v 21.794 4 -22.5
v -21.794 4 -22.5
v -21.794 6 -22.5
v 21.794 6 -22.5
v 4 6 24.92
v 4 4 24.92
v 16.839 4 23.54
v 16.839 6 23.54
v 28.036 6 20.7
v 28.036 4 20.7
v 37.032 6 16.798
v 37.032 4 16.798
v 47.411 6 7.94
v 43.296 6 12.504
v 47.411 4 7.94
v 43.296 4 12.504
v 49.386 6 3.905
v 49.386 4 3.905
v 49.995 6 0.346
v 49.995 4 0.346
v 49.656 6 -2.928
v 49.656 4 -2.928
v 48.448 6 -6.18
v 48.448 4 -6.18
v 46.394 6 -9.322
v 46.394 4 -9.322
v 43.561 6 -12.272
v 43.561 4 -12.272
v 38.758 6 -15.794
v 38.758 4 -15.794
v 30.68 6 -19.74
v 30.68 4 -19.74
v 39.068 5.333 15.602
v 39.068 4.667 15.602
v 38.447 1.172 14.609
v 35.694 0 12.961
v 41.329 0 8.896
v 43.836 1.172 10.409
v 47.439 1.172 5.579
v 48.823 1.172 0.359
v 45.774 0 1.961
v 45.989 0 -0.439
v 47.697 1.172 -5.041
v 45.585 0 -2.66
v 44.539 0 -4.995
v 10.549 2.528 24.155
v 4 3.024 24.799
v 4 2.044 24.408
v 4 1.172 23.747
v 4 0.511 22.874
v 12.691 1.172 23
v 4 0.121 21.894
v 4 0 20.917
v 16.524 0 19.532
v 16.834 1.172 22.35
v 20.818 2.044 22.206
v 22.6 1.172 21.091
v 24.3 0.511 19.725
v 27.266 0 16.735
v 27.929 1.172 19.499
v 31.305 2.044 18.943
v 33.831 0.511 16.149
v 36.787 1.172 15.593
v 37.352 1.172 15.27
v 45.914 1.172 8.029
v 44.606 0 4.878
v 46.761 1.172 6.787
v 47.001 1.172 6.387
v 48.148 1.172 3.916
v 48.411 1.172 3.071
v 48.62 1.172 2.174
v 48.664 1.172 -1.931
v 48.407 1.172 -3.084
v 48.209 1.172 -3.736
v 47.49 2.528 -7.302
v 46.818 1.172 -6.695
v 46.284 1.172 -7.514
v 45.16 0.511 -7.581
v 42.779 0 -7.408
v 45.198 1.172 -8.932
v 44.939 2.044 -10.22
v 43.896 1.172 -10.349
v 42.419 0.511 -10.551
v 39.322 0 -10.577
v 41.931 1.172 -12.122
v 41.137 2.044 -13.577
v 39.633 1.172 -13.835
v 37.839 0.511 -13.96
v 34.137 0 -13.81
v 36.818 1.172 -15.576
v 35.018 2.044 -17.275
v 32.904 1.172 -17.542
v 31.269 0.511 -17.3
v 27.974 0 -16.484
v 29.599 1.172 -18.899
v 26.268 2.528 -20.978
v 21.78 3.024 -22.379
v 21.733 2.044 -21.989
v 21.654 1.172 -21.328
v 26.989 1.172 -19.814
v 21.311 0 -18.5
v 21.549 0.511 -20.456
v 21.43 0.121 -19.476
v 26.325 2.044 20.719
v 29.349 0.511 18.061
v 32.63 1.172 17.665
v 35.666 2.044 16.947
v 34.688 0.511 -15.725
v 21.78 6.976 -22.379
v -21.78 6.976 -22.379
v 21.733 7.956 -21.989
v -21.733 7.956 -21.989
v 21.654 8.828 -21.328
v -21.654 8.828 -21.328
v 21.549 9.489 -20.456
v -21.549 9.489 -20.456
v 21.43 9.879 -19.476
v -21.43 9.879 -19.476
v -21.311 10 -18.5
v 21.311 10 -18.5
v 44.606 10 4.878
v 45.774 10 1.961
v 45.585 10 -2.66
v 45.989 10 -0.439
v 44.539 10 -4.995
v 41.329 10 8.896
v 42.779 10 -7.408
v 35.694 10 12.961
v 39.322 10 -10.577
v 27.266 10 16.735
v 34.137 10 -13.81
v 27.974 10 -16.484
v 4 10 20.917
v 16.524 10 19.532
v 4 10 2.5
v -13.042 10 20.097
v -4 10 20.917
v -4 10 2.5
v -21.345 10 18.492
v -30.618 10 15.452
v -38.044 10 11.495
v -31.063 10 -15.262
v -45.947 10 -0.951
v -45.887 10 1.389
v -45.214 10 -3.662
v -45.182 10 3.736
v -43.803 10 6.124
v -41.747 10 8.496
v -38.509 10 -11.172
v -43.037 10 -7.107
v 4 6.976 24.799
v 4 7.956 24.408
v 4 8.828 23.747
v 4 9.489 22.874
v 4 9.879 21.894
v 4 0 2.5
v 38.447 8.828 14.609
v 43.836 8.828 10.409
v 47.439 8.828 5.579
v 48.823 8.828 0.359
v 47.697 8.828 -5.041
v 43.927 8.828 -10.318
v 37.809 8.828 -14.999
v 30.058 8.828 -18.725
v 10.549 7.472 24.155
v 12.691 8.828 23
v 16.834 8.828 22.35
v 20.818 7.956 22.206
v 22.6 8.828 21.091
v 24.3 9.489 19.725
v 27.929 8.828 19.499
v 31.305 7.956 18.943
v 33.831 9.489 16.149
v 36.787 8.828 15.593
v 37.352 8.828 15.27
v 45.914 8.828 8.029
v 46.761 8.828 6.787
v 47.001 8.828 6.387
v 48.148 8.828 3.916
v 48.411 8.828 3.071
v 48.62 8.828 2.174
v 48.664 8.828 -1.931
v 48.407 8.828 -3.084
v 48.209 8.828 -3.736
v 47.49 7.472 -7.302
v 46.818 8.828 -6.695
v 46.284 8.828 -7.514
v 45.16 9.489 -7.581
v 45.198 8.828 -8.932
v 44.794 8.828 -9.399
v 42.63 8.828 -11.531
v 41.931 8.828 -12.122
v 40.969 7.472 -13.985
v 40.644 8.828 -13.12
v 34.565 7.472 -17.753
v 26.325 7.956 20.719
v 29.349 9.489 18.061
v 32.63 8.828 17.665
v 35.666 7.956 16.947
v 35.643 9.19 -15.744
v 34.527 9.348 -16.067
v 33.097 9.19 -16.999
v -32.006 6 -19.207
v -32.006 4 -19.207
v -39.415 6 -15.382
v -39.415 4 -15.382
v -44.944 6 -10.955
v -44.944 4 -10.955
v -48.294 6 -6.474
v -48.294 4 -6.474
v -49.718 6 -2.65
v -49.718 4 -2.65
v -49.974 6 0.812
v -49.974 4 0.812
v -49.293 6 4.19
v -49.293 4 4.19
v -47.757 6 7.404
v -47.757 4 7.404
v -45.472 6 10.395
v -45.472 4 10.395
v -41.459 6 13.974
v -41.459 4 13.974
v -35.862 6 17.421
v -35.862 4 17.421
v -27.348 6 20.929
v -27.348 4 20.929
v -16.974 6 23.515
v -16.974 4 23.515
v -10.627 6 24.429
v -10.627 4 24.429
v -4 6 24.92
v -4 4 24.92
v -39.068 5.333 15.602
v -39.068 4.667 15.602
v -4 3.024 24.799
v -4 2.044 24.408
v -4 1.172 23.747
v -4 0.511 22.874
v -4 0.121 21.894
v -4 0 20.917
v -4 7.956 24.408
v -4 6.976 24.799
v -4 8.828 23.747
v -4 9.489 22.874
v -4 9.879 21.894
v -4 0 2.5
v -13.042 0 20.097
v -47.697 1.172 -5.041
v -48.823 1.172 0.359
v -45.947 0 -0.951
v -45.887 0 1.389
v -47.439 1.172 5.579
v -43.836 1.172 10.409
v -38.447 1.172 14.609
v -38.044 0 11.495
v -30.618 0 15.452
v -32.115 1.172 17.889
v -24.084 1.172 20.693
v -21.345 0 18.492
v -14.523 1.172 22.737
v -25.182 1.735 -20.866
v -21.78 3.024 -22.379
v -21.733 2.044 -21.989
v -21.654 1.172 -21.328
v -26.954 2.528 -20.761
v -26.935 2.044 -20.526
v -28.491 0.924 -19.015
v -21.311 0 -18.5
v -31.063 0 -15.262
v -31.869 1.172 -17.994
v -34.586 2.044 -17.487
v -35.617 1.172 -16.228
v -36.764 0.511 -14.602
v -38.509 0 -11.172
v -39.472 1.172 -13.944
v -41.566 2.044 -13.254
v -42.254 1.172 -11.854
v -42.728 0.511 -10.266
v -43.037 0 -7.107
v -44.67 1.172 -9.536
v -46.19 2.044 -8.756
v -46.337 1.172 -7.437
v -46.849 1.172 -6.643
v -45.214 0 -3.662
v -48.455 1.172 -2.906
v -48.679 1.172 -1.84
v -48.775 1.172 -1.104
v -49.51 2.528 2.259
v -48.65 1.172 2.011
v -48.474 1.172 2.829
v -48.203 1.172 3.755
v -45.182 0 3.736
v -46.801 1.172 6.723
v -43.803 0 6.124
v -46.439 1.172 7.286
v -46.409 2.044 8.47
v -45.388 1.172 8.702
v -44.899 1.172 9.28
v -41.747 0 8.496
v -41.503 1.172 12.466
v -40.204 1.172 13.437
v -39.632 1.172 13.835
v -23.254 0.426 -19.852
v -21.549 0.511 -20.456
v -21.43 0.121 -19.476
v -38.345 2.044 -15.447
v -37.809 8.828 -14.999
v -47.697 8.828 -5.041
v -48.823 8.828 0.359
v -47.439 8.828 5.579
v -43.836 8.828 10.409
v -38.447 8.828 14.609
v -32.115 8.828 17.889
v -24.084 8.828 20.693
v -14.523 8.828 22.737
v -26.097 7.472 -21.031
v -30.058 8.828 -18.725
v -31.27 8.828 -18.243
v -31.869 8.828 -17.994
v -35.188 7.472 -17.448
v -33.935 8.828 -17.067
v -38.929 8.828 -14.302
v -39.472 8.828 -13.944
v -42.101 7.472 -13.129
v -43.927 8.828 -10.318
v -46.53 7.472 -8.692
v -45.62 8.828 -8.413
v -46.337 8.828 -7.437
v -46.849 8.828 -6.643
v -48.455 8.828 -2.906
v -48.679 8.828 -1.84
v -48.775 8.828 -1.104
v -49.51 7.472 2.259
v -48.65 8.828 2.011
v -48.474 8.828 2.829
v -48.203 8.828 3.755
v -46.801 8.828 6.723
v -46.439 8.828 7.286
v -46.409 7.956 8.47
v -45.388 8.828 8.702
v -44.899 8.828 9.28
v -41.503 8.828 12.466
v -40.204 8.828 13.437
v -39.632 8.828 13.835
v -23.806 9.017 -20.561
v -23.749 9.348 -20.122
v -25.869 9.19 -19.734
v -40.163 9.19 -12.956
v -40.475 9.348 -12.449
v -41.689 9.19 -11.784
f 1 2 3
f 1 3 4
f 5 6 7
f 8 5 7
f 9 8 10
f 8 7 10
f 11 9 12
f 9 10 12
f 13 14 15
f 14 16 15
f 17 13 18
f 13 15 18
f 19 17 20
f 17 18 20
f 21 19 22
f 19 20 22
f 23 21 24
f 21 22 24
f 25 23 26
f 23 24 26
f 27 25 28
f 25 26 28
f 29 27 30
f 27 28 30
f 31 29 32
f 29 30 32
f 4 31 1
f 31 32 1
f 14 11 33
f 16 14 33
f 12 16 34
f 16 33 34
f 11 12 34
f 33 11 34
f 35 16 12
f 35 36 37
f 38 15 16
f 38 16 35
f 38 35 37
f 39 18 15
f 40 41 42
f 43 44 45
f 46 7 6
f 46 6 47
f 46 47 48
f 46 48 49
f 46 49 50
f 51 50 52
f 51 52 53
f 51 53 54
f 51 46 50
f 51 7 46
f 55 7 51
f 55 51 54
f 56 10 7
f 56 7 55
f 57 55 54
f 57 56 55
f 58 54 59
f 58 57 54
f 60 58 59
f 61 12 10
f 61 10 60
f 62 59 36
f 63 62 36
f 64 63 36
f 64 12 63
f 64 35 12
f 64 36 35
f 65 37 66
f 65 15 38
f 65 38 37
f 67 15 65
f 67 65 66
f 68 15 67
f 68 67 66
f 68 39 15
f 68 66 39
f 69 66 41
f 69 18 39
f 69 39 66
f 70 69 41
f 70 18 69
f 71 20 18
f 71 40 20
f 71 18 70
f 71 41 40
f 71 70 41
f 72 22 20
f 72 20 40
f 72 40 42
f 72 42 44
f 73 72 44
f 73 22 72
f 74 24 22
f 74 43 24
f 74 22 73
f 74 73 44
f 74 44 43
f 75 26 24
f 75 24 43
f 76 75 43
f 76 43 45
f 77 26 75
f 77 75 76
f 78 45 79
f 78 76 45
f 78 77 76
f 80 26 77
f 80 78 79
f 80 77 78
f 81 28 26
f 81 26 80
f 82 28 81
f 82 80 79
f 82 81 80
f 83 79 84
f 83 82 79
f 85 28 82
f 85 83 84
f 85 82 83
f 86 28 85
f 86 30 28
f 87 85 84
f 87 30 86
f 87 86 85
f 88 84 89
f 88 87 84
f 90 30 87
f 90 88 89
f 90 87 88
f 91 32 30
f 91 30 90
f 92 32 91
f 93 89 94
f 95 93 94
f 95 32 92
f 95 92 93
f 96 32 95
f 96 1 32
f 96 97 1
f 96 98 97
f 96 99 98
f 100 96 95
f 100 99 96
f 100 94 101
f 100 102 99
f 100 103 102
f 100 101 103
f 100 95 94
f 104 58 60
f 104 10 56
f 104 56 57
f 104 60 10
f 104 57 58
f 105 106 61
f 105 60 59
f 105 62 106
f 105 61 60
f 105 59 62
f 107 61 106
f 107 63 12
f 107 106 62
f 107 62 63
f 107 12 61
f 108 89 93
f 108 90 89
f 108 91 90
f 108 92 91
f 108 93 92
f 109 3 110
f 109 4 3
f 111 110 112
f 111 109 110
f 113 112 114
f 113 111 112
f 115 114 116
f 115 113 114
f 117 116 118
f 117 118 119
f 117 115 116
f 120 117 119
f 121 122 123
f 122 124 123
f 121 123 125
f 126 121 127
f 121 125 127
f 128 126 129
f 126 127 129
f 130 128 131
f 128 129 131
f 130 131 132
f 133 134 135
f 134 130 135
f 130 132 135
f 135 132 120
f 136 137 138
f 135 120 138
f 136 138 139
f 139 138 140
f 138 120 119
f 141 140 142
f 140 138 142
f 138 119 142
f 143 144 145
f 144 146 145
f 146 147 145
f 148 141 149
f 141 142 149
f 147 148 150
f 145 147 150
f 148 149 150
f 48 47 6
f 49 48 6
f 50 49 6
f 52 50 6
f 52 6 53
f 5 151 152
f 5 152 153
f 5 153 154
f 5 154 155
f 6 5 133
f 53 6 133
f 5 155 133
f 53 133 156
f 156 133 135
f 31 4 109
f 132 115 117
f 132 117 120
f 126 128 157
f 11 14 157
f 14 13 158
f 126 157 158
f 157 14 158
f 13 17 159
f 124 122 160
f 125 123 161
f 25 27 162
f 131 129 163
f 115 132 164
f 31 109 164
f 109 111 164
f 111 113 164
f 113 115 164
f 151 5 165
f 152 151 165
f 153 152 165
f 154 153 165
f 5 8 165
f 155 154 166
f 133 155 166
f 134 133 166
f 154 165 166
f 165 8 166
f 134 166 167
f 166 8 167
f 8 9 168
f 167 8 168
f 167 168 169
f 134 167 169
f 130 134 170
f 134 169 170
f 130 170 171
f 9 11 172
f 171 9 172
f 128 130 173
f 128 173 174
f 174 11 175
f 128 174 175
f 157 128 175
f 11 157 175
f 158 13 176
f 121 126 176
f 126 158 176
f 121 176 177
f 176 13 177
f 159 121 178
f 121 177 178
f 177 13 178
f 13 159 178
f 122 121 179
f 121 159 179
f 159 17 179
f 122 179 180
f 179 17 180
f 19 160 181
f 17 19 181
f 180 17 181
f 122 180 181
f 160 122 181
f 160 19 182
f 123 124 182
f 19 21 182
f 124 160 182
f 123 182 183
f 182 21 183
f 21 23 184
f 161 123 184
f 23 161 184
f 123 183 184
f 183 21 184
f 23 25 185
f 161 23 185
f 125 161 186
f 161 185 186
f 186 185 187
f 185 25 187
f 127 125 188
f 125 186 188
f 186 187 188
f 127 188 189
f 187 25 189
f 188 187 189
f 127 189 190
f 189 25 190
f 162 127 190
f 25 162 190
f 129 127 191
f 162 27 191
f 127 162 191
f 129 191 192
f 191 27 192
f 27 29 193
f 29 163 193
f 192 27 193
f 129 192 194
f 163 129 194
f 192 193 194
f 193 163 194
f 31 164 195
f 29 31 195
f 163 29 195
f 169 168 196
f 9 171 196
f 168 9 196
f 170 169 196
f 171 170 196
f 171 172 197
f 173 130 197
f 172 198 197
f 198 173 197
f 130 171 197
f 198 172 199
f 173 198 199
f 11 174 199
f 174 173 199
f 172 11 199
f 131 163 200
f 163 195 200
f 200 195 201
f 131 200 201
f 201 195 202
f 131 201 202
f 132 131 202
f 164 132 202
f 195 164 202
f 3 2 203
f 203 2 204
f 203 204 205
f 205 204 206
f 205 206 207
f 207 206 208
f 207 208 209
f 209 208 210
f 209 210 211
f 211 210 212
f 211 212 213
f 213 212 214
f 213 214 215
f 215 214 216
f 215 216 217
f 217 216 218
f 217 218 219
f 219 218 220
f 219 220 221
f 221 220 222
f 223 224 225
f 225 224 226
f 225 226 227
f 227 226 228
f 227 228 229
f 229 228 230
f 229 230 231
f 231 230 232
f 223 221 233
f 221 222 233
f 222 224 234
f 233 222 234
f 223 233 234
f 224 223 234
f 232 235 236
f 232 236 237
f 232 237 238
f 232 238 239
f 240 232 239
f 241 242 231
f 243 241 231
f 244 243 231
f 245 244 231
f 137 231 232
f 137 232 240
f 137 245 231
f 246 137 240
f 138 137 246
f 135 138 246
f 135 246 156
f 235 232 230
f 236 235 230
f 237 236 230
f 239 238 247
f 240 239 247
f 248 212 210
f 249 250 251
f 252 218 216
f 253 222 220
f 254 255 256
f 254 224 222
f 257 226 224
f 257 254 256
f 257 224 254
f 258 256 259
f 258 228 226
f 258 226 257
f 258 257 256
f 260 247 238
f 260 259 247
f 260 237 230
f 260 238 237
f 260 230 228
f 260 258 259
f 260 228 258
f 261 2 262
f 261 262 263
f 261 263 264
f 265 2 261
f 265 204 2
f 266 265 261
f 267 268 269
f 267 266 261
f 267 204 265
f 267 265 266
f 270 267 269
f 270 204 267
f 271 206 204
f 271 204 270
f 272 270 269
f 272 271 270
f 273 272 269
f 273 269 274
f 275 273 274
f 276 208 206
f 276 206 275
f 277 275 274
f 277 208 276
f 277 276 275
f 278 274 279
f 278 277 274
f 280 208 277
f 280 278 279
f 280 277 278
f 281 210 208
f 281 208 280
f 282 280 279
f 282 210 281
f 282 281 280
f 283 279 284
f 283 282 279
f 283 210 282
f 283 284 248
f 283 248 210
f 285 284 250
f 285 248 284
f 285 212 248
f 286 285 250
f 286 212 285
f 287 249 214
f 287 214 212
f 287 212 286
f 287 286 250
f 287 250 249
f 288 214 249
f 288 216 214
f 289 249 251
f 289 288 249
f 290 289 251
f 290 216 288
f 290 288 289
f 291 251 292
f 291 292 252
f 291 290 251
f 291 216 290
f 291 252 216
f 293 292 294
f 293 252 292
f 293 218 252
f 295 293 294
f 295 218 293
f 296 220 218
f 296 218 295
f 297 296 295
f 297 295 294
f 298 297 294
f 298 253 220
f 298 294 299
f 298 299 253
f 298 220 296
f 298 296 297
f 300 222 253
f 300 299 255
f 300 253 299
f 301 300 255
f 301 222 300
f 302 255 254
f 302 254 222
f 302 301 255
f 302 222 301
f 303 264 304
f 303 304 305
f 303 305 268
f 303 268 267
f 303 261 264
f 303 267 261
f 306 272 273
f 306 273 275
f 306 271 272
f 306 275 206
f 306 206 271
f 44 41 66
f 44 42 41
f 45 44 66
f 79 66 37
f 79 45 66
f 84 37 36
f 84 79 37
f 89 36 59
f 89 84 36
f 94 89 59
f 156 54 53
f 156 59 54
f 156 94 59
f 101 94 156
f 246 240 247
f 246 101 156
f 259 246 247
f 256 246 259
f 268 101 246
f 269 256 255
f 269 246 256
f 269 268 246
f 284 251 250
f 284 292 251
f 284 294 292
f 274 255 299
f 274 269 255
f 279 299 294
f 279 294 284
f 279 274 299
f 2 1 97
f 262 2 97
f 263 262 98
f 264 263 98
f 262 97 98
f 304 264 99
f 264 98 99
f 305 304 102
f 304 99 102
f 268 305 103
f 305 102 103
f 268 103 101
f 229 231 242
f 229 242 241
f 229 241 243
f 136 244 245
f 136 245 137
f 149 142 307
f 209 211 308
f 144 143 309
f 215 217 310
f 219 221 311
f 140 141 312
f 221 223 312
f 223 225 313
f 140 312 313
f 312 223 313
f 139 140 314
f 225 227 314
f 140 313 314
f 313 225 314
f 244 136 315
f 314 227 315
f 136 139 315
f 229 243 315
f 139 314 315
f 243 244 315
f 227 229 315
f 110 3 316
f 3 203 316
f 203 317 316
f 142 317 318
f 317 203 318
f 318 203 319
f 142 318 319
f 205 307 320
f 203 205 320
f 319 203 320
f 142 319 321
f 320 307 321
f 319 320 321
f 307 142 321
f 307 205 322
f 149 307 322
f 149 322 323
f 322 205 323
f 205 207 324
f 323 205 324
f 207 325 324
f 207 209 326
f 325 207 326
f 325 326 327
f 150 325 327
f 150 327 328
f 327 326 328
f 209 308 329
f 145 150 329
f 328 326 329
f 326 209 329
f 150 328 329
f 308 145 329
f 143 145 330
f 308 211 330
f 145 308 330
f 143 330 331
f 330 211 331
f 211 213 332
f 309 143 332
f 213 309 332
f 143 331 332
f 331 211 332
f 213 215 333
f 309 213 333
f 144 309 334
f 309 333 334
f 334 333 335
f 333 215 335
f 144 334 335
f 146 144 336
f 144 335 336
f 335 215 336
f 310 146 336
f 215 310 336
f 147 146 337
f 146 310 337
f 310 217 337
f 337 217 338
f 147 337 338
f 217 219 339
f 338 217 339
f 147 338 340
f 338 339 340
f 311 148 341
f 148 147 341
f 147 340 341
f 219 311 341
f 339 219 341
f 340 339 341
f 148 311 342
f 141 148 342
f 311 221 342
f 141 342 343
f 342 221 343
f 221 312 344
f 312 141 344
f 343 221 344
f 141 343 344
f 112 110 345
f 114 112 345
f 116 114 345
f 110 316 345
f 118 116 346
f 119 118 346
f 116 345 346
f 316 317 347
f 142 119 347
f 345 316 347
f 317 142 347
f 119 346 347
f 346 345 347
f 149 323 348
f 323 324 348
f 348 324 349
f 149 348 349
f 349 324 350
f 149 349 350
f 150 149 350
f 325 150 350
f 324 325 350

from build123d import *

# Parameters (mm, degrees)
BOSS_EXTRUDE1_DEPTH = 10
SKETCH5_W           = 8
SKETCH5_H           = 30
CUT_EXTRUDE4_DEPTH  = 10
FILLET12_R          = 4


with BuildPart() as part:
    # Sketch1 → Boss-Extrude1 (new body)
    with BuildSketch(Plane(origin=(0, 0, 0), x_dir=(1, 0, 0), z_dir=(0, 1, 0))):
        with BuildLine():
            Line((-21.794494718, 22.5), (21.794494718, 22.5))
            add(Edge.make_bspline(
                [(-21.794494718, 22.5), (-78.136825066, 8.856081987), (-39.068412533, -15.601755848), (0, -40.059593683), (39.068412533, -15.601755848), (78.136825066, 8.856081987), (21.794494718, 22.5)],
                knots=[2.021823139, 2.021823139, 2.021823139, 3.8155337, 3.8155337, 5.609244261, 5.609244261, 7.402954822, 7.402954822, 7.402954822], degree=2, weights=[1, 0.624070234, 1, 0.624070234, 1, 0.624070234, 1]))
        make_face()
    extrude(amount=BOSS_EXTRUDE1_DEPTH)

    # Sketch5 → Cut-Extrude4 (cut)
    with BuildSketch(Plane(origin=(0, 10, 0), x_dir=(1, 0, 0), z_dir=(0, 1, 0))):
        with Locations((0, -17.5)):
            Rectangle(SKETCH5_W, SKETCH5_H)
    extrude(amount=-CUT_EXTRUDE4_DEPTH, mode=Mode.SUBTRACT)

    # Fillet12
    fillet12_edges = [part.edges().sort_by_distance(p)[0] for p in [
        (47.117377831, 10, 8.365893651),
        (0, 0, -22.5),
        (-47.117377875, 0, 8.365893589),
        (-47.117377875, 10, 8.365893589),
        (0, 10, -22.5),
        (47.117377831, 0, 8.365893651),
    ]]
    fillet(fillet12_edges, radius=FILLET12_R)


solid = part.part
